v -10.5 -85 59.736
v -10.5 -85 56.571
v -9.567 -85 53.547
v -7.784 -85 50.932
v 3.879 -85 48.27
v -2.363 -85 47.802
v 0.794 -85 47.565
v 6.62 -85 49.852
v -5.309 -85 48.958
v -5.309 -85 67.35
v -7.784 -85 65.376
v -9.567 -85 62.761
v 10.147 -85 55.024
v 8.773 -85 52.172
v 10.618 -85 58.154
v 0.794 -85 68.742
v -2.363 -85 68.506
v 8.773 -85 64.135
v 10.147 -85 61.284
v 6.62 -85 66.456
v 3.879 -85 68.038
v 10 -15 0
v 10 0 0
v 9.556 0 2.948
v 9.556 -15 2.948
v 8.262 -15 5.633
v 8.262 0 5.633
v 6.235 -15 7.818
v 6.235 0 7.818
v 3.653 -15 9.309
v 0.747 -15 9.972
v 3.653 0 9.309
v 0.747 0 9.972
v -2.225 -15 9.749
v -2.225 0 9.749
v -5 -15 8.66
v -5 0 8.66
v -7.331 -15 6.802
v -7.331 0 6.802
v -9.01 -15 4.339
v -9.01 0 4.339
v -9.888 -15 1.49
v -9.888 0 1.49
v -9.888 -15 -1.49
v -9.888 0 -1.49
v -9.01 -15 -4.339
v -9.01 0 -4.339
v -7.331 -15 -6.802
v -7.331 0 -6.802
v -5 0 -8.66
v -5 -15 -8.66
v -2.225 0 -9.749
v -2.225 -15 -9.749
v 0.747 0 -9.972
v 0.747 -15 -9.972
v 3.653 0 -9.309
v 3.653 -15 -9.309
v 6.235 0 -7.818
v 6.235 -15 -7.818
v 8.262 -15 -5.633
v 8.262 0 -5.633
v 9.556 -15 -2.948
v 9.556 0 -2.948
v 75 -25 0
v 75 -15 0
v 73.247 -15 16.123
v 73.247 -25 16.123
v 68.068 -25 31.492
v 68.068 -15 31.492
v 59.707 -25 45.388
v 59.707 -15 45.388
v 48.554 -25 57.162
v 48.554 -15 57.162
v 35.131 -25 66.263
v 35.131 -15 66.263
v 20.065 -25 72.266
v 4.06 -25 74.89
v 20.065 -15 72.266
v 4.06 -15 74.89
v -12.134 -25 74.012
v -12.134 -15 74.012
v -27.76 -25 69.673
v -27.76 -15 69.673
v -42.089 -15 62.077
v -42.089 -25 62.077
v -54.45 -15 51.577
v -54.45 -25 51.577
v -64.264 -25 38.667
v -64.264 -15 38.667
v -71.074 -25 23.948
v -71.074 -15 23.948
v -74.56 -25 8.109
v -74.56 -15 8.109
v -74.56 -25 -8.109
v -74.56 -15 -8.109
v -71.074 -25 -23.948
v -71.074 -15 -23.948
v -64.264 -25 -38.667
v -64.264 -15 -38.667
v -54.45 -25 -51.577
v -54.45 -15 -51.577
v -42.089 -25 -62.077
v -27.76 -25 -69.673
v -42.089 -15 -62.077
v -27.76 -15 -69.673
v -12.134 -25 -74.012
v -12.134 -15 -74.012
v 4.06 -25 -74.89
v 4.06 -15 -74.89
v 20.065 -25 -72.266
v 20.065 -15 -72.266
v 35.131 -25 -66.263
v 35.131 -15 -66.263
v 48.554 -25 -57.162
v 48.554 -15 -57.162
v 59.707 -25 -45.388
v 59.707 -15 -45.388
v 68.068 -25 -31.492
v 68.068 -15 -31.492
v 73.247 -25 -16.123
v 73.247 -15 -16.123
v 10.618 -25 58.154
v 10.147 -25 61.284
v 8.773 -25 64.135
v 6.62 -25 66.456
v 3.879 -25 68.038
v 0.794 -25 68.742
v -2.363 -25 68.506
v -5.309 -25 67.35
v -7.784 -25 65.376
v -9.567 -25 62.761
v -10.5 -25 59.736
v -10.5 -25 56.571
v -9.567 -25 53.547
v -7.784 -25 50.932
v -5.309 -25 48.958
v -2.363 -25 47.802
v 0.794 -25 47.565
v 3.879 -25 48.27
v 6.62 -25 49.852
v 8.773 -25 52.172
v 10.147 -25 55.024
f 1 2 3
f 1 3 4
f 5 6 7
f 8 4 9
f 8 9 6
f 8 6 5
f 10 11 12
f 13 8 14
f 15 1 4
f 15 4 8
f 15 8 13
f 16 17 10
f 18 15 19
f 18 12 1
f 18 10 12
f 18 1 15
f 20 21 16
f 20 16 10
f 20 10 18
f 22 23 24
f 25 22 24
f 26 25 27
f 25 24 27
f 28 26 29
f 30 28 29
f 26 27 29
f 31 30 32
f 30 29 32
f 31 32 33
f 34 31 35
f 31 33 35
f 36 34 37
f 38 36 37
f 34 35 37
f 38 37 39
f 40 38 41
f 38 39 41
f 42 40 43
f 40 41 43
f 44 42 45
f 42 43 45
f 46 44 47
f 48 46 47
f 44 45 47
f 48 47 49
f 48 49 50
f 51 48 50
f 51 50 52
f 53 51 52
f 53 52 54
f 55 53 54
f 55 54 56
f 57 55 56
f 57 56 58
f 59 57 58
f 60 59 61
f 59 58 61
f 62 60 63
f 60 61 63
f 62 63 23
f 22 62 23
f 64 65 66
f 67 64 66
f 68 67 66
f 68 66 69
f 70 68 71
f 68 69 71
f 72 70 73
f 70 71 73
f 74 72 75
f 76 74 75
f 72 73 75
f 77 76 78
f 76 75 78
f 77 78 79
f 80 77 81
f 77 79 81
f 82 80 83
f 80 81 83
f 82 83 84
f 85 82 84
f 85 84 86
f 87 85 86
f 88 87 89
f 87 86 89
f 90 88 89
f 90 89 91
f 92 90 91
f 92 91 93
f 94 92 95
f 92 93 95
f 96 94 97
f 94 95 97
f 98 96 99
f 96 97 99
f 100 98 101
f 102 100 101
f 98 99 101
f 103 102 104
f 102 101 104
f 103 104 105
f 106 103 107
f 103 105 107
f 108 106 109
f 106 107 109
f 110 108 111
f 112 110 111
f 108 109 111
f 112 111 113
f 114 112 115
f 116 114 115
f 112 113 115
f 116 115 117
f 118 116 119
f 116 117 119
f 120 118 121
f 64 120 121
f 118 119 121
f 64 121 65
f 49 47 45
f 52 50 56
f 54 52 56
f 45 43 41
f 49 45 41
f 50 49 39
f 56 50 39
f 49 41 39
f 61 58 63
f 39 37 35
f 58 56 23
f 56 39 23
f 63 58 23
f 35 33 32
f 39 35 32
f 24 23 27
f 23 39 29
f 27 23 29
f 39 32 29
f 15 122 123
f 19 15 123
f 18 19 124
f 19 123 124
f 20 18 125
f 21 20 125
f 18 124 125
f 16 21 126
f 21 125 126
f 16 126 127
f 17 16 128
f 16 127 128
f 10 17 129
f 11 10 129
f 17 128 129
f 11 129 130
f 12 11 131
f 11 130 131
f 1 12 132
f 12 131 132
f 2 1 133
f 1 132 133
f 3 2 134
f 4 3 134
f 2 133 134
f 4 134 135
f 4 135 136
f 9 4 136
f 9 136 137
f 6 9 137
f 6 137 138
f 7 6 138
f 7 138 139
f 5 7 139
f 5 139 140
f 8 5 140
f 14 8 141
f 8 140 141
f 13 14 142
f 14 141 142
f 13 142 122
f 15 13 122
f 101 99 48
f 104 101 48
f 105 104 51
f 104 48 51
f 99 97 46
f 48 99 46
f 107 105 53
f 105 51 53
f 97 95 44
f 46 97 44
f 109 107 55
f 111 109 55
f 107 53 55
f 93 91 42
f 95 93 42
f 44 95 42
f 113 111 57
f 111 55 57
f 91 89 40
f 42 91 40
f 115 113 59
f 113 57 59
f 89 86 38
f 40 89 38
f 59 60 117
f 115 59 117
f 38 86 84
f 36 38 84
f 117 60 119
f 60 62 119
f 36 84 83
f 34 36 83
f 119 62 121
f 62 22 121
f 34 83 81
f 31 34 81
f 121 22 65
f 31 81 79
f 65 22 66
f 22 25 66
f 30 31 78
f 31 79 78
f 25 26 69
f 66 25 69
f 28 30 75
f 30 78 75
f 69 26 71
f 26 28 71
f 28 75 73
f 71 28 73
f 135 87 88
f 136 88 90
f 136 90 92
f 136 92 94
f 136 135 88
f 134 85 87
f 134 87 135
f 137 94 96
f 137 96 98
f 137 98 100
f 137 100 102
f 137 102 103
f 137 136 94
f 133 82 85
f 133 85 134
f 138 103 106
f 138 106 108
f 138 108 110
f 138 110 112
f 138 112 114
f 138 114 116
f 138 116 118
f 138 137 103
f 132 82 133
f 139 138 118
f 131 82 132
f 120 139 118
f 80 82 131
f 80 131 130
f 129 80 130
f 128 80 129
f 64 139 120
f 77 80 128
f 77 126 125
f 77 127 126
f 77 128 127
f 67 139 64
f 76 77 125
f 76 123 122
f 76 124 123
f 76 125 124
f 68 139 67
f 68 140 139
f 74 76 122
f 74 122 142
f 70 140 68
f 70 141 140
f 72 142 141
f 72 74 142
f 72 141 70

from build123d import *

# Parameters (mm, degrees)
F0_R     = 10
F1_DEPTH = 15
F2_R     = 75
F3_DEPTH = 10
F4_R     = 10.618259
F5_DEPTH = 60


with BuildPart() as f1:
    # F0 (on Front) → F1 (new body)
    with BuildSketch(Plane.XZ):
        Circle(F0_R)
    extrude(amount=F1_DEPTH)

    # F2 (on face) → F3 (join)
    with BuildSketch(Plane.XZ.offset(15)):
        Circle(F2_R)
    extrude(amount=F3_DEPTH)

    # F4 (on face) → F5 (join)
    with BuildSketch(Plane.XZ.offset(25)):
        with Locations((0, 58.153849)):
            Circle(F4_R)
    extrude(amount=F5_DEPTH)


solid = f1.part
